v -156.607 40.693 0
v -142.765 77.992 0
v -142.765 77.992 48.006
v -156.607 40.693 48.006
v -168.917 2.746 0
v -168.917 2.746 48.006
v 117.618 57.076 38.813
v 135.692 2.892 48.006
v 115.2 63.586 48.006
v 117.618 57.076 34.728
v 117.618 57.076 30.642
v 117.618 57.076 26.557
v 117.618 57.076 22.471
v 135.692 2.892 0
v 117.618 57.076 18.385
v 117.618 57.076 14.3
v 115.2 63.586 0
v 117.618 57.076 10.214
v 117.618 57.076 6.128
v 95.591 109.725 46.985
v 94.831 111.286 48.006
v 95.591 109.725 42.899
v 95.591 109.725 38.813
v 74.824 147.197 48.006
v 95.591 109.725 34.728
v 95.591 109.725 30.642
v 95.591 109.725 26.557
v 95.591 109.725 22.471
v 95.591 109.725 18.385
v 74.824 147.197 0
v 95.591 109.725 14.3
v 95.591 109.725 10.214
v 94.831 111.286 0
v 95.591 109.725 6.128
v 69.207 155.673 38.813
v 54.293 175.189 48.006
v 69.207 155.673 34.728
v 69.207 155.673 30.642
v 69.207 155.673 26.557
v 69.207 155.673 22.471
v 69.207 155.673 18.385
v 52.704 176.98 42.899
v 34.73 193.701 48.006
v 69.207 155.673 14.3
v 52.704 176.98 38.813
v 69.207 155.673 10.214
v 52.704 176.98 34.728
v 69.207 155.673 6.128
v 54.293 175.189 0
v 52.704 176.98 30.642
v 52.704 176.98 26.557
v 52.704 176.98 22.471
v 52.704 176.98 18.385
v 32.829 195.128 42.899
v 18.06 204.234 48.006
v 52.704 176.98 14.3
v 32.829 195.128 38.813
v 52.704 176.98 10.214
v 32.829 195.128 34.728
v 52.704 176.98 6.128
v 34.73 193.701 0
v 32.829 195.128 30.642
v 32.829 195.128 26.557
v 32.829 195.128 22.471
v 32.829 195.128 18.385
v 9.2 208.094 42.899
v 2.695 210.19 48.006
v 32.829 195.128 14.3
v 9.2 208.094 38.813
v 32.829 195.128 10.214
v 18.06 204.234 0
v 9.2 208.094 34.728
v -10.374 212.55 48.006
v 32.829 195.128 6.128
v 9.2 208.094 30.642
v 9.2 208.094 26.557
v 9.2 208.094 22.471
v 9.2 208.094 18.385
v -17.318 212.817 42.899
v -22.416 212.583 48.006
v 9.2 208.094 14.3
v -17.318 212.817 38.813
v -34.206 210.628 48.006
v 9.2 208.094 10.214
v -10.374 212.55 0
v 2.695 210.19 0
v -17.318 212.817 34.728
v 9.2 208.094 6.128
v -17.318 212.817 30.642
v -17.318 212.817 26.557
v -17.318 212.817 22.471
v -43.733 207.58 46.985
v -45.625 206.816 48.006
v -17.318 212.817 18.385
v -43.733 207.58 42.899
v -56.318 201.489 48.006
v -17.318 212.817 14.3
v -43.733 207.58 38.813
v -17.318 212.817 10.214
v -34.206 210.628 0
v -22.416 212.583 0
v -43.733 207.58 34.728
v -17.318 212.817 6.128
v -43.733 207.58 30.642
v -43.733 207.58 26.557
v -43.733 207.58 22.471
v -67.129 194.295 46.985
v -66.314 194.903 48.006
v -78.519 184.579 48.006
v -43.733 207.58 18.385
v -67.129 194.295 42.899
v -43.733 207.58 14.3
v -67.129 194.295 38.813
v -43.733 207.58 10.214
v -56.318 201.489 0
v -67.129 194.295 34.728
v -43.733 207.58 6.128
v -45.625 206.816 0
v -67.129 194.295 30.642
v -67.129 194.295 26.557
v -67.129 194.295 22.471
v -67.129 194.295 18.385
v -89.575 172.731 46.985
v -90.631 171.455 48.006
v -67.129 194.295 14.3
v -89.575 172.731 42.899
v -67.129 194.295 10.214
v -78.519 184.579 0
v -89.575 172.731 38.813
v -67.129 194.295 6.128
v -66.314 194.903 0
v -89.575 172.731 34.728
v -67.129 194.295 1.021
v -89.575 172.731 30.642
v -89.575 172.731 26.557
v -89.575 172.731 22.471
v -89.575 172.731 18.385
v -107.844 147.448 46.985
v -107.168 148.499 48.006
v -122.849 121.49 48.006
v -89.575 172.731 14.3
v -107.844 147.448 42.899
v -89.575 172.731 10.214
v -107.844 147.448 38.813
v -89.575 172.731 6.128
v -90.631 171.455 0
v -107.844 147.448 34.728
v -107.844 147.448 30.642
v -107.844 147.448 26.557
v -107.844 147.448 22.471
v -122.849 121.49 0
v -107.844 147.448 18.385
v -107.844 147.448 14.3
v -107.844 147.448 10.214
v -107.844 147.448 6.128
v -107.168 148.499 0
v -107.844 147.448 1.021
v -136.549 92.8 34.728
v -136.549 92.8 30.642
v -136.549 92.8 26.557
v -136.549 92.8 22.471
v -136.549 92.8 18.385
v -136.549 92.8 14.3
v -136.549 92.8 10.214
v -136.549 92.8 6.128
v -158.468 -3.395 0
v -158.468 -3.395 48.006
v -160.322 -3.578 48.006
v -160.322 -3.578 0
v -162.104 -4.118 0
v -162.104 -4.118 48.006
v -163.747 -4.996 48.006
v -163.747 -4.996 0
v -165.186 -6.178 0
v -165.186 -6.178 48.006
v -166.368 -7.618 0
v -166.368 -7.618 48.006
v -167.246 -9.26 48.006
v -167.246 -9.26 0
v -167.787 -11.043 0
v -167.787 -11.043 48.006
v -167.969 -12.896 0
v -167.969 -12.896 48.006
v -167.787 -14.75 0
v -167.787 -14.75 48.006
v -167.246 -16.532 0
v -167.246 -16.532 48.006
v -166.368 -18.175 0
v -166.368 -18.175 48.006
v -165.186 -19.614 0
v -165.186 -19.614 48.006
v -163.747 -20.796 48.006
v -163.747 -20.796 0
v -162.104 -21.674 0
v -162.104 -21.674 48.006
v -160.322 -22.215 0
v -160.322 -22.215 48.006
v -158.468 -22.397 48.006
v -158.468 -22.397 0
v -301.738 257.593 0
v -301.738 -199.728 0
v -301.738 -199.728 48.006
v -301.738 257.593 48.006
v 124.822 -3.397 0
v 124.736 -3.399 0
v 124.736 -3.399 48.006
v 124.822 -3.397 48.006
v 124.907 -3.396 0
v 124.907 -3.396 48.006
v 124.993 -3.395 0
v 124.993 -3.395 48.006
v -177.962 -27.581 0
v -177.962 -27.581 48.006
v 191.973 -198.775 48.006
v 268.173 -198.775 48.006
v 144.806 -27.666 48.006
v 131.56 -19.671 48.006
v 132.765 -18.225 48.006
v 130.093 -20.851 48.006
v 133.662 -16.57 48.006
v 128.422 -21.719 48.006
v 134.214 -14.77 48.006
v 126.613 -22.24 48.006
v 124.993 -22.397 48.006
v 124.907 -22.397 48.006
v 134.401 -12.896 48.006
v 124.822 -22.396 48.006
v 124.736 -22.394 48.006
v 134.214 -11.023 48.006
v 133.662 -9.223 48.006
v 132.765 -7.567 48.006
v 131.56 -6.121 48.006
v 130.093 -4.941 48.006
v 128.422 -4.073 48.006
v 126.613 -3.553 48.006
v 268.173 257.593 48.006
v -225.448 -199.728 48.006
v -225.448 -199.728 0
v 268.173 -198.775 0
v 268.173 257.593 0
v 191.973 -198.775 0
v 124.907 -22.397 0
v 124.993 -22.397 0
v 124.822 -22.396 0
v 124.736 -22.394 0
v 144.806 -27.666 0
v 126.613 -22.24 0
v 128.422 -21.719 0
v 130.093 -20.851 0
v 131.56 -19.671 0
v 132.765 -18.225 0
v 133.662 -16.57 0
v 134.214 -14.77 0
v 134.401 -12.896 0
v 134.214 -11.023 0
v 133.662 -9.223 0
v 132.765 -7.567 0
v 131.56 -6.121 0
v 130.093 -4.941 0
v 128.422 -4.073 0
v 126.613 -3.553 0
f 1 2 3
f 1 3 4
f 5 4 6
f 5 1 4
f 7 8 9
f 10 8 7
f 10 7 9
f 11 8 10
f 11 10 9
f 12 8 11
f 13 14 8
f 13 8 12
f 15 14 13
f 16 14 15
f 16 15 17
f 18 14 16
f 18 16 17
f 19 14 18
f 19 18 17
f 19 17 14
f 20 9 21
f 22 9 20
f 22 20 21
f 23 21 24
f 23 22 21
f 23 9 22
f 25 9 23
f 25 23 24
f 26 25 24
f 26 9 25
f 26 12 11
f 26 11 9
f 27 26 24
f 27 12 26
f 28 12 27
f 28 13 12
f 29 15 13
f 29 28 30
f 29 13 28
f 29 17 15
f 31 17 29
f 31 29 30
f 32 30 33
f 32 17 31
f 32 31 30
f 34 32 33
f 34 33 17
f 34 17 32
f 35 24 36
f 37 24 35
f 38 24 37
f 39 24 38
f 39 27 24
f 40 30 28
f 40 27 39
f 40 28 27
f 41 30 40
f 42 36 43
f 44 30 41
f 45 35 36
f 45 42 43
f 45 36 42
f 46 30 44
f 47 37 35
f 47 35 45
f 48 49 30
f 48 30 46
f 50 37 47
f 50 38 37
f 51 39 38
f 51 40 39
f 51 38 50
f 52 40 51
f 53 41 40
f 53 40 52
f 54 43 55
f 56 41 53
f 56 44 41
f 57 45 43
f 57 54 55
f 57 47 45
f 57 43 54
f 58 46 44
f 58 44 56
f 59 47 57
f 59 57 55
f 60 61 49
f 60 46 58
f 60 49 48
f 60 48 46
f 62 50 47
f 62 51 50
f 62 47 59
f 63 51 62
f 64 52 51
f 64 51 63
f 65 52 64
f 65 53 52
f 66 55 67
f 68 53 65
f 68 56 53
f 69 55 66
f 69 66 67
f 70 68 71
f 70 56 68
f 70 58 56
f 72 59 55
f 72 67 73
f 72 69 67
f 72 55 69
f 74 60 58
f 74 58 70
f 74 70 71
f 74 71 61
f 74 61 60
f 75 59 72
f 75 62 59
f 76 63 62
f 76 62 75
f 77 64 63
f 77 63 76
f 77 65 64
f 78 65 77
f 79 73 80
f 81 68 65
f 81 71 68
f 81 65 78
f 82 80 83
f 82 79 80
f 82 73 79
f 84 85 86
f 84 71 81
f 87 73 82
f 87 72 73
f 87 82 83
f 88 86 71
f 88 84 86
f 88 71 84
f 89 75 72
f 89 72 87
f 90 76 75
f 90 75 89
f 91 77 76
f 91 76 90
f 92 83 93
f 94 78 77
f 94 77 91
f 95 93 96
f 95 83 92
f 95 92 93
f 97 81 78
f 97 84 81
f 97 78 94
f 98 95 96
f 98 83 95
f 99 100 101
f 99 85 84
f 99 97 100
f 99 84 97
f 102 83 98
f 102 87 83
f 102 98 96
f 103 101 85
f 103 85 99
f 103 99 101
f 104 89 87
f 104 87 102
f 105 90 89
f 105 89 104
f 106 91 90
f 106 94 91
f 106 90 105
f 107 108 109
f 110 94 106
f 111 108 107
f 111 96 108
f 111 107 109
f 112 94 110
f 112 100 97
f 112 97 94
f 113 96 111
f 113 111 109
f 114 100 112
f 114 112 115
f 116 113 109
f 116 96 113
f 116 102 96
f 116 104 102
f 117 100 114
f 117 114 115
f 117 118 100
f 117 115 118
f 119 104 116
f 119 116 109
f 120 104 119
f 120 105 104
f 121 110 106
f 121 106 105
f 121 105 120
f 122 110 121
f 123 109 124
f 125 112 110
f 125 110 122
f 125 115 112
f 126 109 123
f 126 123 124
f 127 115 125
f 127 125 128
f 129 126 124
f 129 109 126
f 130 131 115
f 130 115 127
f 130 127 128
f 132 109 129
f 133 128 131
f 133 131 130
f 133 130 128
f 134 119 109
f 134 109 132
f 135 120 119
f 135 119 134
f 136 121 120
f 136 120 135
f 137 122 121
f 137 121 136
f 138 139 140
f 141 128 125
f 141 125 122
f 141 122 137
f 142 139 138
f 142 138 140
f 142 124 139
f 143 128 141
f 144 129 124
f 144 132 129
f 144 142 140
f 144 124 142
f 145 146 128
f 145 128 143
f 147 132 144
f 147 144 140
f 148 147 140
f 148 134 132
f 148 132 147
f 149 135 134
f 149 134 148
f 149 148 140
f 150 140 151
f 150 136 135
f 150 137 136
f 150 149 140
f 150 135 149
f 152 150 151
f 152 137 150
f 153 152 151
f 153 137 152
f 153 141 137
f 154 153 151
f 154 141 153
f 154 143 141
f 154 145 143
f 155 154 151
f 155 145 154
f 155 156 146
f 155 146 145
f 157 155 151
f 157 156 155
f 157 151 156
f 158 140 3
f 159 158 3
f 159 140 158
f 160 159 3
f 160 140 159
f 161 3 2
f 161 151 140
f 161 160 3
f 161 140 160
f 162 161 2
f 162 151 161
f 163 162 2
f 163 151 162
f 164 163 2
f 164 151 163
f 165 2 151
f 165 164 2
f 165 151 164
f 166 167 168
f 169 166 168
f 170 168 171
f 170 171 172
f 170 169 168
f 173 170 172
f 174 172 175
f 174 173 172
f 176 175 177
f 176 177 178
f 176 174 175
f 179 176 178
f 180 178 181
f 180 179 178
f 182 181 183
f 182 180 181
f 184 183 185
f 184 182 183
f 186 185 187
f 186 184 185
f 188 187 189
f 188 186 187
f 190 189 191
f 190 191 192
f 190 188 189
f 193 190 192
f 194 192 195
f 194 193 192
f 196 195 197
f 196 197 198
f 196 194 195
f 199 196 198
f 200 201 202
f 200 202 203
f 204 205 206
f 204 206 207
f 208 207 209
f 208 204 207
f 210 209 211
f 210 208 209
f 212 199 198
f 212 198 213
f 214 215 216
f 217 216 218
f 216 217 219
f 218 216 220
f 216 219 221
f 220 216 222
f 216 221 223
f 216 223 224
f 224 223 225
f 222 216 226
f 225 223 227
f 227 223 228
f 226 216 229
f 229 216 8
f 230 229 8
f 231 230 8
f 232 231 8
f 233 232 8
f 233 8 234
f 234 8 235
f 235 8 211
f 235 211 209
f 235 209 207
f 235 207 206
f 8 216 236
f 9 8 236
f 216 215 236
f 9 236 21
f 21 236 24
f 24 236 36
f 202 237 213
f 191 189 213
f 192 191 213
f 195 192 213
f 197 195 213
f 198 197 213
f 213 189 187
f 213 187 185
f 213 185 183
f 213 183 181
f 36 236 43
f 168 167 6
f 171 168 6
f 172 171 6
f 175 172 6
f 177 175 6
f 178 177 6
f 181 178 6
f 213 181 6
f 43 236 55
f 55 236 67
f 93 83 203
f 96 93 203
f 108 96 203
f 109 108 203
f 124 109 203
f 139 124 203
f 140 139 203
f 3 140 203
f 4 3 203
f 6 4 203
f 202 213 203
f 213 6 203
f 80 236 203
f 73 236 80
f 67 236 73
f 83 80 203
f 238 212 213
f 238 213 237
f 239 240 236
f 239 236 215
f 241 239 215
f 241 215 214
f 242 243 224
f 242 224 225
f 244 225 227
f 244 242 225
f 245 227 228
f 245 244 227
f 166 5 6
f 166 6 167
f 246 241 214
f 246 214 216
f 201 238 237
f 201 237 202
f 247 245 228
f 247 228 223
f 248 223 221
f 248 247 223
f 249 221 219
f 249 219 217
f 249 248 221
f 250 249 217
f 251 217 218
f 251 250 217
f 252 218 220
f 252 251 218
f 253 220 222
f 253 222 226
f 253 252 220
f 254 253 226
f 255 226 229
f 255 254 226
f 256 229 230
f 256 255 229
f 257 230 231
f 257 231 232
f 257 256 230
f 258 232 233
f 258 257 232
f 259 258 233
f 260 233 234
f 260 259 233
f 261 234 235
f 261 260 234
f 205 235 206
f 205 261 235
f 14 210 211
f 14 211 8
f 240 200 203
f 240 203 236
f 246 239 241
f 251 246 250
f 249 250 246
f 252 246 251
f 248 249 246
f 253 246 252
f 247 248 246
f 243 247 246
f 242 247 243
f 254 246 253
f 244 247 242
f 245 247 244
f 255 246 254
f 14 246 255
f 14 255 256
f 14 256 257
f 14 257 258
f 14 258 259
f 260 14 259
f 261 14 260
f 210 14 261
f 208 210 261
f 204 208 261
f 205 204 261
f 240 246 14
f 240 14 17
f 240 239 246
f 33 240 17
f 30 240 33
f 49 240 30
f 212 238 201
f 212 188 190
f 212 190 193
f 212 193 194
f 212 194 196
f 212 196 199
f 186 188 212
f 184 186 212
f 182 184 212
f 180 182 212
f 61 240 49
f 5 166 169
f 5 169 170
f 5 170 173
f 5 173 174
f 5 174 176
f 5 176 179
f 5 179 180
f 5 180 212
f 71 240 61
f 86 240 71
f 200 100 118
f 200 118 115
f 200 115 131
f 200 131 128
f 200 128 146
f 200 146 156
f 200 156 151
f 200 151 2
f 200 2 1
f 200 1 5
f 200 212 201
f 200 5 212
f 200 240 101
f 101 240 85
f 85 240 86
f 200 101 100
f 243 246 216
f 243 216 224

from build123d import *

# Parameters (mm, degrees)
BOSS_EXTRUDE1_DEPTH = 48.006


with BuildPart() as part:
    # Sketch1 → Boss-Extrude1 (new body)
    with BuildSketch(Plane.XY):
        with BuildLine():
            Line((-225.447809165, -199.728491805), (-301.738433253, -199.728491805))
            Line((-301.738433253, -199.728491805), (-301.738433253, 257.593482095))
            Line((-301.738433253, 257.593482095), (268.17262038, 257.593482095))
            Line((268.17262038, 257.593482095), (268.17262038, -198.775273895))
            Line((268.17262038, -198.775273895), (191.97262038, -198.775273895))
            add(Edge.make_bspline(
                [(191.97262038, -198.775273895), (176.395114076, -144.717919568), (162.628696684, -89.958041402), (146.381833133, -33.125288105), (145.596508442, -30.394873062), (144.806285869, -27.666357915)],
                knots=[-0.175685276, -0.175685276, -0.175685276, -0.175685276, 0.0625, 0.0625, 0.074528353, 0.074528353, 0.074528353, 0.074528353], degree=3))
            Line((144.806285869, -27.666357915), (124.993066201, -22.397165799))
            ThreePointArc((124.993066201, -22.397165799), (124.864606243, -22.396297326), (124.73616977, -22.393692067))
            ThreePointArc((124.73616977, -22.393692067), (134.400862059, -12.896168334), (124.73616977, -3.398644601))
            ThreePointArc((124.73616977, -3.398644601), (124.864606243, -3.396039342), (124.993066201, -3.395170869))
            Line((124.993066201, -3.395170869), (135.691858465, 2.892490258))
            add(Edge.make_bspline(
                [(135.691858465, 2.892490258), (135.314696992, 4.116620429), (134.936080504, 5.340186197), (132.368798727, 13.599894472), (130.130676764, 20.616852667), (125.524522045, 34.600376485), (123.157499627, 41.56733402), (115.797446194, 62.367745534), (110.548077039, 76.101765603), (101.84386822, 96.380777425), (98.803508299, 103.086546431), (92.37760033, 116.364185503), (88.991984333, 122.93602921), (81.793802186, 135.914102083), (77.981892113, 142.320585742), (71.869018874, 151.777087043), (69.765373982, 154.903644709), (66.498270777, 159.550177507), (65.389046261, 161.093925459), (63.139466255, 164.154354329), (61.999715438, 165.67035493), (59.688642648, 168.672361294), (58.516582662, 170.157665892), (56.118741461, 173.07723611), (54.894863863, 174.513310302), (51.146947128, 178.749057722), (48.547654076, 181.477234393), (43.125667167, 186.721341125), (40.303191615, 189.237478591), (36.614892879, 192.230444978), (35.869197363, 192.821403706), (34.36104399, 193.987395747), (33.597594293, 194.563112067), (31.290848107, 196.257908313), (29.73009776, 197.345850464), (24.975195611, 200.476791242), (21.708805955, 202.387660075), (16.643768494, 204.951334349), (14.927623421, 205.755045007), (11.435265949, 207.25259756), (9.658083095, 207.946955193), (0.616700415, 211.11100678), (-6.80726538, 212.55901149), (-15.400709246, 212.817467767), (-16.361129064, 212.827100658), (-18.275408627, 212.807502125), (-19.229283176, 212.778493337), (-22.08129591, 212.634925473), (-23.969832382, 212.463879049), (-29.597806643, 211.72933027), (-33.29991159, 210.94619693), (-37.868364024, 209.619128706), (-38.779108314, 209.336382439), (-40.594790871, 208.736732777), (-41.500300425, 208.419508903), (-44.186884114, 207.425196579), (-45.945273264, 206.703343413), (-51.131977033, 204.378066365), (-54.471381822, 202.614119431), (-60.94714312, 198.71963022), (-64.083562314, 196.589201119), (-67.890435469, 193.720972815), (-68.646713056, 193.136501551), (-70.140924932, 191.953327653), (-70.879689492, 191.354019242), (-73.071882243, 189.533784208), (-77.359998234, 185.804199186), (-81.380776129, 181.827144094), (-86.530702533, 176.328982508), (-89.001075507, 173.483084422), (-92.556331251, 169.075103844), (-93.716272996, 167.582502096), (-96.008092078, 164.571319881), (-97.138335587, 163.05122701), (-99.369002363, 159.983437205), (-100.470213051, 158.434560023), (-102.635373146, 155.322818496), (-103.700307999, 153.758645522), (-108.941626474, 145.898561066), (-112.869324351, 139.485640885), (-120.291186221, 126.455819246), (-123.784949756, 119.838729369), (-130.416658057, 106.437133943), (-133.554665544, 99.652657904), (-142.536695847, 79.095973907), (-147.950288071, 65.121244796), (-154.26729307, 47.441111613), (-155.507905268, 43.894362657), (-157.949711034, 36.782317953), (-159.151256343, 33.216131938), (-162.702412424, 22.502511371), (-164.998557993, 15.339085837), (-167.801898158, 6.355762084), (-168.361264212, 4.551240347), (-168.917377957, 2.745760058)],
                knots=[0.119568765, 0.119568765, 0.119568765, 0.119568765, 0.125, 0.125, 0.15625, 0.15625, 0.1875, 0.1875, 0.25, 0.25, 0.28125, 0.28125, 0.3125, 0.3125, 0.34375, 0.34375, 0.359375, 0.359375, 0.3671875, 0.3671875, 0.375, 0.375, 0.3828125, 0.3828125, 0.390625, 0.390625, 0.40625, 0.40625, 0.421875, 0.421875, 0.42578125, 0.42578125, 0.4296875, 0.4296875, 0.4375, 0.4375, 0.453125, 0.453125, 0.4609375, 0.4609375, 0.46875, 0.46875, 0.5, 0.5, 0.50390625, 0.50390625, 0.5078125, 0.5078125, 0.515625, 0.515625, 0.53125, 0.53125, 0.53515625, 0.53515625, 0.5390625, 0.5390625, 0.546875, 0.546875, 0.5625, 0.5625, 0.578125, 0.578125, 0.58203125, 0.58203125, 0.5859375, 0.5859375, 0.59375, 0.609375, 0.609375, 0.625, 0.625, 0.6328125, 0.6328125, 0.640625, 0.640625, 0.6484375, 0.6484375, 0.65625, 0.65625, 0.6875, 0.6875, 0.71875, 0.71875, 0.75, 0.75, 0.8125, 0.8125, 0.828125, 0.828125, 0.84375, 0.84375, 0.875, 0.875, 0.882849734, 0.882849734, 0.882849734, 0.882849734], degree=3))
            Line((-168.917377957, 2.745760058), (-158.468254986, -3.395170869))
            ThreePointArc((-158.468254986, -3.395170869), (-167.969252451, -12.896168334), (-158.468254986, -22.397165799))
            Line((-158.468254986, -22.397165799), (-177.961890902, -27.581366771))
            add(Edge.make_bspline(
                [(-177.961890902, -27.581366771), (-178.686003141, -30.081297074), (-179.405906532, -32.582467849), (-195.783154386, -89.803151614), (-209.643570839, -145.052272814), (-225.447809165, -199.728491805)],
                knots=[0.926684911, 0.926684911, 0.926684911, 0.926684911, 0.9375, 0.9375, 1.173999231, 1.173999231, 1.173999231, 1.173999231], degree=3))
        make_face()
    extrude(amount=BOSS_EXTRUDE1_DEPTH)


solid = part.part
